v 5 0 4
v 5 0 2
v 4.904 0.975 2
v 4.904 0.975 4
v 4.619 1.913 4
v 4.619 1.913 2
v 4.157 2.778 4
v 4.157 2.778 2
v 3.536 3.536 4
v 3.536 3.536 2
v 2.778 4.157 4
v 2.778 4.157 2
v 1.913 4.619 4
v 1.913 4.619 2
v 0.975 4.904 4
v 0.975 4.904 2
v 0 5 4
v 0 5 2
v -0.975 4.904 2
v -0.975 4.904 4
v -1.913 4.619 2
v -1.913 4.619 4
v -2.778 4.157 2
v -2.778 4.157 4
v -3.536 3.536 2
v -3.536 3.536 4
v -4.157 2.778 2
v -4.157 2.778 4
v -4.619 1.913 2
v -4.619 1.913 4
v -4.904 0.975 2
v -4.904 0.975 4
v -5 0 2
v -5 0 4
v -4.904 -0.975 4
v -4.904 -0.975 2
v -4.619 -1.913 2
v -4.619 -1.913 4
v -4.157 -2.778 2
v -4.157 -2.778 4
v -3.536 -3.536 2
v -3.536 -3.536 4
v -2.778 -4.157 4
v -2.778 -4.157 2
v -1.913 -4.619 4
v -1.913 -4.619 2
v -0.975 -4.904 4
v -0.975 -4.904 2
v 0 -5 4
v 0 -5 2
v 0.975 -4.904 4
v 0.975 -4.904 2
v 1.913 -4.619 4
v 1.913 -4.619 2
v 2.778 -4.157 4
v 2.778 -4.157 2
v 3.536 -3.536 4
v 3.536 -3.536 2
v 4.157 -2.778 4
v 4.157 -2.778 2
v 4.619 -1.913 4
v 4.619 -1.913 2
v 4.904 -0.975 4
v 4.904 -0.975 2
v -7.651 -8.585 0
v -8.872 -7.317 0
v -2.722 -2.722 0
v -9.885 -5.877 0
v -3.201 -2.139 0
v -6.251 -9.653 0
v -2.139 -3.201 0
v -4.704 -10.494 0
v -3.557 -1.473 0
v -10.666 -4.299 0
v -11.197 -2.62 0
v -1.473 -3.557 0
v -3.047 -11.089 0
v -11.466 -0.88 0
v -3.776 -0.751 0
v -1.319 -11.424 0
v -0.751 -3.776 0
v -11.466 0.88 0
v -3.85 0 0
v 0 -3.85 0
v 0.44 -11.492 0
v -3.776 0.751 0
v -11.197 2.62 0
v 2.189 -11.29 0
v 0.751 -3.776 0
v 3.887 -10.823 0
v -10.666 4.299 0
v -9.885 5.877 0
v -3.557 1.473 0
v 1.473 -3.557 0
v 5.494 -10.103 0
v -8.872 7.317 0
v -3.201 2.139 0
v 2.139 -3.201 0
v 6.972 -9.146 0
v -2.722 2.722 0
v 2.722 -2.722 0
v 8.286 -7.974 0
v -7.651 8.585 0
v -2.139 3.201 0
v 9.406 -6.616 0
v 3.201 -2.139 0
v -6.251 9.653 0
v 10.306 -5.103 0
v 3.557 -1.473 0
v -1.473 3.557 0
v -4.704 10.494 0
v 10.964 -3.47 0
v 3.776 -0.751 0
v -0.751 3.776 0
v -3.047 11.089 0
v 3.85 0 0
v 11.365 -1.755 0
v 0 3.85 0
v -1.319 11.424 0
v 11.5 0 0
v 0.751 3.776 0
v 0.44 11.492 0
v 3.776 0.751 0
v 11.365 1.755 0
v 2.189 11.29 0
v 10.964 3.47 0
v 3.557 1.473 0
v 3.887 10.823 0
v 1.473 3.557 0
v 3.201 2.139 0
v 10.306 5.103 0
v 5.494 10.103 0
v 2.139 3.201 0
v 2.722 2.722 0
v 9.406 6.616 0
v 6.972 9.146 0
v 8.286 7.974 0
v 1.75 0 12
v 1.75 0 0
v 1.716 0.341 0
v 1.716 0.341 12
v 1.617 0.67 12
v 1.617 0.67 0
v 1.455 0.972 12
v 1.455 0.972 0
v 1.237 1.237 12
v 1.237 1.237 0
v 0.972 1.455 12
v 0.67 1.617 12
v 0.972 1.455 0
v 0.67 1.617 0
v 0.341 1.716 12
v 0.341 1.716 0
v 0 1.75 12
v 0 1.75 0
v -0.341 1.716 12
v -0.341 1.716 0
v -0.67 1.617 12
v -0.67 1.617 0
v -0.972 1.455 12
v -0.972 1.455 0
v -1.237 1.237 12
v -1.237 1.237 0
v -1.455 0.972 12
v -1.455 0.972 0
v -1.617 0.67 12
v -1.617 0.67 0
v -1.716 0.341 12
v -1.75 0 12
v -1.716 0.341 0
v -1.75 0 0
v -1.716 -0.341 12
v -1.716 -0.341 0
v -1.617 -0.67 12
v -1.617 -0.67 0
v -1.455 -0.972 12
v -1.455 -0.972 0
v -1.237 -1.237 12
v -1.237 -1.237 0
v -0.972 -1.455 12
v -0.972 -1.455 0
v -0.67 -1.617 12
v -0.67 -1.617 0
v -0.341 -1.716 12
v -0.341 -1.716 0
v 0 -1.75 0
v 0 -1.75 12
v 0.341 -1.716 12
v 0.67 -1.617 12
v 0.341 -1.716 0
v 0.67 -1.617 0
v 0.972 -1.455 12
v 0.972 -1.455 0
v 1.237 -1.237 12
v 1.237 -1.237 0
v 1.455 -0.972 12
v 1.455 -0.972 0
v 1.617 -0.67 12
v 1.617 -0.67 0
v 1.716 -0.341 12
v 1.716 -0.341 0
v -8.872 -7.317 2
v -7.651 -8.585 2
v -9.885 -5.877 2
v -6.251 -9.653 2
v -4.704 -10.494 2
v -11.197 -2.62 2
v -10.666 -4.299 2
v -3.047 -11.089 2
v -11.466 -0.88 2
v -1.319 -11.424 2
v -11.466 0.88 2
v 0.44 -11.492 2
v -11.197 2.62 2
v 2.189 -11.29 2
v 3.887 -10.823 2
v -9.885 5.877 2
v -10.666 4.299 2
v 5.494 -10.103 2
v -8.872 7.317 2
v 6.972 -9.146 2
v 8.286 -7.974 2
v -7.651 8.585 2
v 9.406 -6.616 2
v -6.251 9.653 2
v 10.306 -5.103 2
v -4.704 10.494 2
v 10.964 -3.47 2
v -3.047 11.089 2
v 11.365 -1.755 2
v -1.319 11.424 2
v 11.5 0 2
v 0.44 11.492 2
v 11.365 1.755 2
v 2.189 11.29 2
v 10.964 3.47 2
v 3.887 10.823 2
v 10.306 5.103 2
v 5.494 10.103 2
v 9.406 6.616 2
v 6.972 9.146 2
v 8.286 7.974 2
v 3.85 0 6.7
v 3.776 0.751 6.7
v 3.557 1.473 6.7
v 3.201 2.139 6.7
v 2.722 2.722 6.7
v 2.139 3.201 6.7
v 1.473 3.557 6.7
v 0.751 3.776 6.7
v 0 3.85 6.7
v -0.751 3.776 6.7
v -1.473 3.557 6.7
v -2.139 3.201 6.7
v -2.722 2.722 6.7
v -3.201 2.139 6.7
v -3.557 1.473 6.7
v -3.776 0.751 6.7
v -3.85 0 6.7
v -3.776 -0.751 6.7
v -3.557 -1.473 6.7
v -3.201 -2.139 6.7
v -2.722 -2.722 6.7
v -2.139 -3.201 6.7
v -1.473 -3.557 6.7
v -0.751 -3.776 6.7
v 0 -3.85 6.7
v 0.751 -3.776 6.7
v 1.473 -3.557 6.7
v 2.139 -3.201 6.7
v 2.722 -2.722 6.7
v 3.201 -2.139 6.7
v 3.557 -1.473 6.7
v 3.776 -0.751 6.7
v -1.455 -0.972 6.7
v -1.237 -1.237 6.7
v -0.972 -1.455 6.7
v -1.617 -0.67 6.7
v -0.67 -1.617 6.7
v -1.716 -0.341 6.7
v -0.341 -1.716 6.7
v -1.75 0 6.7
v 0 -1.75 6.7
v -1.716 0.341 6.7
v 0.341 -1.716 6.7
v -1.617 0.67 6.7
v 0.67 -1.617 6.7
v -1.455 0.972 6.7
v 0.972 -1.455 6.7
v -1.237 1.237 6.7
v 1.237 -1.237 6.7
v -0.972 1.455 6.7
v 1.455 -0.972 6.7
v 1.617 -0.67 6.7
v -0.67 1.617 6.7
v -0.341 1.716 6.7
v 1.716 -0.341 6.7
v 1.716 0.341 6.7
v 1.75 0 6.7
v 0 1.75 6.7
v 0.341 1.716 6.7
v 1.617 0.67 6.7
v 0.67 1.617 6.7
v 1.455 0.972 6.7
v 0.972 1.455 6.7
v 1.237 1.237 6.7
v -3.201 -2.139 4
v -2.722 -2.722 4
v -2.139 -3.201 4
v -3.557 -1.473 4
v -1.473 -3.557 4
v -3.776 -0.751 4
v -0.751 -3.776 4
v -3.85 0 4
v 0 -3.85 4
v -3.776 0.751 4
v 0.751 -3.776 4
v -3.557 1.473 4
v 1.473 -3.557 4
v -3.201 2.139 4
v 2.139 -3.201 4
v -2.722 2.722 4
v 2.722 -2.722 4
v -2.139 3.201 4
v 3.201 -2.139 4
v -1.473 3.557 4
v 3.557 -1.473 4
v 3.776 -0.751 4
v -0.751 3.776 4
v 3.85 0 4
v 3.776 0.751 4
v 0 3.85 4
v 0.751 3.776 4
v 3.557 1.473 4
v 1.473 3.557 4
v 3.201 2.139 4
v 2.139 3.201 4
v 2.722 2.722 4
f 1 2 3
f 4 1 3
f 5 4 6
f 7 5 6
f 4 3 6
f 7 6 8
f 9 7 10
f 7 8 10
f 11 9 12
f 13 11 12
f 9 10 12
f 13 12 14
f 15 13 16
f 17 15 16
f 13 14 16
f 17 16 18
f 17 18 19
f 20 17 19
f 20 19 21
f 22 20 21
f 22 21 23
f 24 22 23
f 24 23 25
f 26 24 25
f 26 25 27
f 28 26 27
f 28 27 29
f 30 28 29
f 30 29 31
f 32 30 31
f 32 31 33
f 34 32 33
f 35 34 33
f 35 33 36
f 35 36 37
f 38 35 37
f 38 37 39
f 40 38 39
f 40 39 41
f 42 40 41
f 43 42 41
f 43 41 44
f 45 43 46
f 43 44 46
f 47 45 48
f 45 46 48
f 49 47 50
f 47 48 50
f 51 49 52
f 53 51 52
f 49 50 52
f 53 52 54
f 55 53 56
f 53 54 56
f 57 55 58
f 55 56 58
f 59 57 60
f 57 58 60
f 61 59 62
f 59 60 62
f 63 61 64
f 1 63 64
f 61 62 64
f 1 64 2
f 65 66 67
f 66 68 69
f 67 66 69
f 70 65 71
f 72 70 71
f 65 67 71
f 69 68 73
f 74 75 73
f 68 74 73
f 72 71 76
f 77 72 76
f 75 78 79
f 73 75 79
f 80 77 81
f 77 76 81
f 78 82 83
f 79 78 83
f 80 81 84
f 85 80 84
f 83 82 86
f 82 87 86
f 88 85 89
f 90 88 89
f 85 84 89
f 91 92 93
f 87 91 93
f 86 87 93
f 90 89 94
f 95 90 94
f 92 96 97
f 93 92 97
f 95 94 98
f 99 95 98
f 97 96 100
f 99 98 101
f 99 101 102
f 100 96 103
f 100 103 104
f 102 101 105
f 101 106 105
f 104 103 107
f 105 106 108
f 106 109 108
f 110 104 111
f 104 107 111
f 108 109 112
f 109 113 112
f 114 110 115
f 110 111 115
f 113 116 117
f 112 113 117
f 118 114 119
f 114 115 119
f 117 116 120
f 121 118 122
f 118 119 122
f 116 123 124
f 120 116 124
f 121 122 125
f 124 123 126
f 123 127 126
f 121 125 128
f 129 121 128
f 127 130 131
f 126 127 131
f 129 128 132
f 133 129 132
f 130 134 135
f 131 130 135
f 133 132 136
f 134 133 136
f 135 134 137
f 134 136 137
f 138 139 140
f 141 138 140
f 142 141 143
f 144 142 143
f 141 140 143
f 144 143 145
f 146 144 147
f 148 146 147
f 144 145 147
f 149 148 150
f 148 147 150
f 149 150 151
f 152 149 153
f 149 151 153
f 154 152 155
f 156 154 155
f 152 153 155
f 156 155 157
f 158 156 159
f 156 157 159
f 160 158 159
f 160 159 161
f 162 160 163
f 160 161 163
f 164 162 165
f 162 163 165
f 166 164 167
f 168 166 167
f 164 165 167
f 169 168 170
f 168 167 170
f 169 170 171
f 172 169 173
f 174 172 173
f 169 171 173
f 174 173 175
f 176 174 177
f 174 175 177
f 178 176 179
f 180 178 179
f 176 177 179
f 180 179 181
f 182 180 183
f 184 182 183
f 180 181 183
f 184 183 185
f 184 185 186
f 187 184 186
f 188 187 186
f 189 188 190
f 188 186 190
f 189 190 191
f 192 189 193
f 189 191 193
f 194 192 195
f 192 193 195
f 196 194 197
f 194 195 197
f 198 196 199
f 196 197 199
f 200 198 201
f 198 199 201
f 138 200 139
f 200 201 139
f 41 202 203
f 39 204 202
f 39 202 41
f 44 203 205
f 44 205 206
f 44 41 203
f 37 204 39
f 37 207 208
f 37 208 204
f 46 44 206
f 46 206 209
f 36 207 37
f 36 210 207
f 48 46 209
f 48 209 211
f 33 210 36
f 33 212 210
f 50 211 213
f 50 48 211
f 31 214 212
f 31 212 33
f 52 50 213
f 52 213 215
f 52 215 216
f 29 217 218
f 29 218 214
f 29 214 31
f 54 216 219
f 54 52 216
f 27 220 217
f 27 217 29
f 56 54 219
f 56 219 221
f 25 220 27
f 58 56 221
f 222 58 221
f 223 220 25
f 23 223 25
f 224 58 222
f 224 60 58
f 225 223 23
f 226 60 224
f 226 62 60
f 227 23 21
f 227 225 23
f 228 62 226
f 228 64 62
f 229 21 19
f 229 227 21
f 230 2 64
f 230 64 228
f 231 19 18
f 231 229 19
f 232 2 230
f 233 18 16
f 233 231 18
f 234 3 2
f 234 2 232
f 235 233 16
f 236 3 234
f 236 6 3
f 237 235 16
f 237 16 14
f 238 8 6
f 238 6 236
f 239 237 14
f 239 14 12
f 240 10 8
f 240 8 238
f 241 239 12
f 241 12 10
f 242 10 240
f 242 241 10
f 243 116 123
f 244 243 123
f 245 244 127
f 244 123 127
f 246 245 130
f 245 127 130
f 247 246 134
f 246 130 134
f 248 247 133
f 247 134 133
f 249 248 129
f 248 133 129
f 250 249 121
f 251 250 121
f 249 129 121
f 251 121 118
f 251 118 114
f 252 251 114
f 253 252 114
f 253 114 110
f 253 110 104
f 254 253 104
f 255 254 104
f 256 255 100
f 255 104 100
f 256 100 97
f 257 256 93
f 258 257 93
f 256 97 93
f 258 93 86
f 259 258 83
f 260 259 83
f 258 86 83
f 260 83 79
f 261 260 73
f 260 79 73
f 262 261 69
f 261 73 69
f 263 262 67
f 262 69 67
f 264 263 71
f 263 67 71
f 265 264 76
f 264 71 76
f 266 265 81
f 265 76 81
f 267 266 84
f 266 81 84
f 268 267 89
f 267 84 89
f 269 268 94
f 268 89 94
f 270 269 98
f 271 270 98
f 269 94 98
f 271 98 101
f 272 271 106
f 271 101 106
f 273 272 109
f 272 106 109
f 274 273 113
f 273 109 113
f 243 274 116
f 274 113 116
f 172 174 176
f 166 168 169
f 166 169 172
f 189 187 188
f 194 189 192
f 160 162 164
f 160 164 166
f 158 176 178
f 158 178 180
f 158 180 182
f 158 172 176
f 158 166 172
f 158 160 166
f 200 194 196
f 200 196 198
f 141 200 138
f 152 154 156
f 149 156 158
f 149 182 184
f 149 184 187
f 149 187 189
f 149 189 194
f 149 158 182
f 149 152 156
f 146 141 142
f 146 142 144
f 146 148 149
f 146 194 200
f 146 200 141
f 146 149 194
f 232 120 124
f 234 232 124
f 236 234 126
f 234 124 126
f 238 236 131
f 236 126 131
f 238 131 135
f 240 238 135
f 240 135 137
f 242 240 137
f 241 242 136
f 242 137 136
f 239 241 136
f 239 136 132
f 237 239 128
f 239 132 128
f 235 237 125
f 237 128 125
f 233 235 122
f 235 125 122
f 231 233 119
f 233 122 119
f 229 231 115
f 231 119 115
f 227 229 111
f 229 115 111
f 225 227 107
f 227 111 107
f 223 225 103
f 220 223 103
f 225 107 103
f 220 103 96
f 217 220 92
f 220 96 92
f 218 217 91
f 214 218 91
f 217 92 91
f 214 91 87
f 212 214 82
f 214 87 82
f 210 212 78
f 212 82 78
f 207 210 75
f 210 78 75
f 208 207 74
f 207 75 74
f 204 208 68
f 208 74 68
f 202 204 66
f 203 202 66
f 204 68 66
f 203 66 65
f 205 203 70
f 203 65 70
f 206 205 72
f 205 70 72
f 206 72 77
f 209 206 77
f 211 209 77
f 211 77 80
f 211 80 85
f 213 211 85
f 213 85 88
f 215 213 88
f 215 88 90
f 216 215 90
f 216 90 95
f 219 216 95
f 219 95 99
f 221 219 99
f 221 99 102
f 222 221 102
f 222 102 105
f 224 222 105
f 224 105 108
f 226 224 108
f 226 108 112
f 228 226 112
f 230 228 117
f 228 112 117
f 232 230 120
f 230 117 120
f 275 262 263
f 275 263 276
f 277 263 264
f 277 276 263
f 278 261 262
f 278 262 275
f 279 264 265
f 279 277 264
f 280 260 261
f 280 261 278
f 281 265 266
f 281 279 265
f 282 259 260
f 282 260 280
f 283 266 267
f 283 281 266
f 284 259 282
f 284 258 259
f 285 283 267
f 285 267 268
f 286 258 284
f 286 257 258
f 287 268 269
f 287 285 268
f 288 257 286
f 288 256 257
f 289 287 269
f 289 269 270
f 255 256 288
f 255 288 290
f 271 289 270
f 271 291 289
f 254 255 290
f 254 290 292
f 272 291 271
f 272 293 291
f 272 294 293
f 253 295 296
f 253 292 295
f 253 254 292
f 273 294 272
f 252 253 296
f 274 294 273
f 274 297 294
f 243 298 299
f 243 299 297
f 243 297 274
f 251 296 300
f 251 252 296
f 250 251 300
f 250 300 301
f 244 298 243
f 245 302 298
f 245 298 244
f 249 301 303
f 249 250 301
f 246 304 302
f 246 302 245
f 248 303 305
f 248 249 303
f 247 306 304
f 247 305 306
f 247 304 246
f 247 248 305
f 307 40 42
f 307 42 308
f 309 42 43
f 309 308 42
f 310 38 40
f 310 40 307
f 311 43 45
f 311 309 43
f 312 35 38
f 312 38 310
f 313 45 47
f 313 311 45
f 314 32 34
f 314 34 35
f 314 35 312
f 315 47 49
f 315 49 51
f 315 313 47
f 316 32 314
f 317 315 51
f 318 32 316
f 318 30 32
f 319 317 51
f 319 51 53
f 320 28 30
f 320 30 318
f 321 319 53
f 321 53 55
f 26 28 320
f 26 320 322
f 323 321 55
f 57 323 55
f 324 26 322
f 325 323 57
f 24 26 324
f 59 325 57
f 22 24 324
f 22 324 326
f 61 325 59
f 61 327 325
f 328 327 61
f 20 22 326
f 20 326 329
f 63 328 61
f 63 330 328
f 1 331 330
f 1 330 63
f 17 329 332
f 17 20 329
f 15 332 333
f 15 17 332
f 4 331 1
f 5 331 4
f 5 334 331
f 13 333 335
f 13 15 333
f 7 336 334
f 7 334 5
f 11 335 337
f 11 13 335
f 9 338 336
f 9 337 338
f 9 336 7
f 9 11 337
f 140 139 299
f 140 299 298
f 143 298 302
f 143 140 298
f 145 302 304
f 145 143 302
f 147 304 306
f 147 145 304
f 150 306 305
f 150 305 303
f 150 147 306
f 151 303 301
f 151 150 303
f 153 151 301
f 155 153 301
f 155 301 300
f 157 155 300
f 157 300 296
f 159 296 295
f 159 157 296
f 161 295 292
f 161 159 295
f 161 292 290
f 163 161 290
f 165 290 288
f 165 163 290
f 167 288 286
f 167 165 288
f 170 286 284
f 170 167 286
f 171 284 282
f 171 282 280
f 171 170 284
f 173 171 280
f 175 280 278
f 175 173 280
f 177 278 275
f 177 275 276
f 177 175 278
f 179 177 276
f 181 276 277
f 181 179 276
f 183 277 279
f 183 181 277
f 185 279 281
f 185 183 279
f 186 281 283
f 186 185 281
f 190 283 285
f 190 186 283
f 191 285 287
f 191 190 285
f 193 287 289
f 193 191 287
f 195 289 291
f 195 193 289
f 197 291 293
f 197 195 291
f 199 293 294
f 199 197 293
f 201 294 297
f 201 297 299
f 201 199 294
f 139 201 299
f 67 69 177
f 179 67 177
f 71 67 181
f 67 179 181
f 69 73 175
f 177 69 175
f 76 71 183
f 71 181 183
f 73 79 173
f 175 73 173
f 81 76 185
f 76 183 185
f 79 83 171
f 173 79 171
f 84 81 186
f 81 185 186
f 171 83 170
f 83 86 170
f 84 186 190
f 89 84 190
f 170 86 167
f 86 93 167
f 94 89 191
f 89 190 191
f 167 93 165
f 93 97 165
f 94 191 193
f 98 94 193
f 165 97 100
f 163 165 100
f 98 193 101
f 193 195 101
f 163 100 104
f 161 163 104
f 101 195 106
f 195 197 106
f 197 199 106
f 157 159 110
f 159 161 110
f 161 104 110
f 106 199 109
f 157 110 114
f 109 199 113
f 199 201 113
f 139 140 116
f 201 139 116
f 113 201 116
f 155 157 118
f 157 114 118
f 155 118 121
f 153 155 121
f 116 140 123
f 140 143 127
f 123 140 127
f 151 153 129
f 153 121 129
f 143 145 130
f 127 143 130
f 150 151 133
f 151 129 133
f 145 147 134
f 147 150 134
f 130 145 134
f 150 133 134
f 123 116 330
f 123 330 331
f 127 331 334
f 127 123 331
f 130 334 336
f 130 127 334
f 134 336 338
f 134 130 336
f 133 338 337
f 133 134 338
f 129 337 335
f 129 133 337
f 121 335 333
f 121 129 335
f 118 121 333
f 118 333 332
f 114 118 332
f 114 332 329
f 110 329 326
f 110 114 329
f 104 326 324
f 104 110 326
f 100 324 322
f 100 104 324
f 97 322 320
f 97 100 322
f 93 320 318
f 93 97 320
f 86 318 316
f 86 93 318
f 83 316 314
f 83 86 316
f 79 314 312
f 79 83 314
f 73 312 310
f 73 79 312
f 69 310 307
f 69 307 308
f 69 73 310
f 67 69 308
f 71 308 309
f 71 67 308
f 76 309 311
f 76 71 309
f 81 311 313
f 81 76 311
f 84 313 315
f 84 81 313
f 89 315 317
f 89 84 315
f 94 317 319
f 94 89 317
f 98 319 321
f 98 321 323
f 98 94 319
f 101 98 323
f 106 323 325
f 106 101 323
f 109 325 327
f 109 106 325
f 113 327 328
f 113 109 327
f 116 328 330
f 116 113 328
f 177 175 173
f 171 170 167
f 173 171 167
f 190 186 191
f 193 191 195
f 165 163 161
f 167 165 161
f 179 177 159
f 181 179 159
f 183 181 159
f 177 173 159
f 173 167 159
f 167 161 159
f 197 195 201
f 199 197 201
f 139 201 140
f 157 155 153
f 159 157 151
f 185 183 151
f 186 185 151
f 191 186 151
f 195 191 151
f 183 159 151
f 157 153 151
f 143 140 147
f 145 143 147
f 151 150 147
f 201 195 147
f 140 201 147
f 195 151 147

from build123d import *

# Parameters (mm, degrees)
F0_R     = 11.5
F0_R_2   = 5
F1_DEPTH = 2
F0_R_3   = 3.85
F2_DEPTH = 4
F0_R_4   = 1.75
F3_DEPTH = 12
F4_DEPTH = 6.7


with BuildPart() as f1:
    # F0 (on Top) → F1 (new body)
    with BuildSketch(Plane.XY):
        Circle(F0_R)
        Circle(F0_R_2, mode=Mode.SUBTRACT)
    extrude(amount=F1_DEPTH)

    # F0 (on Top) → F2 (join)
    with BuildSketch(Plane.XY):
        Circle(F0_R_2)
        Circle(F0_R_3, mode=Mode.SUBTRACT)
    extrude(amount=F2_DEPTH)


with BuildPart() as f3:
    # F0 (on Top) → F3 (new body)
    with BuildSketch(Plane.XY):
        Circle(F0_R_4)
    extrude(amount=F3_DEPTH)


with BuildPart() as f4:
    # F0 (on Top) → F4 (new body)
    with BuildSketch(Plane.XY):
        Circle(F0_R_3)
        Circle(F0_R_4, mode=Mode.SUBTRACT)
    extrude(amount=F4_DEPTH)


solid = Compound([f1.part, f3.part, f4.part])
